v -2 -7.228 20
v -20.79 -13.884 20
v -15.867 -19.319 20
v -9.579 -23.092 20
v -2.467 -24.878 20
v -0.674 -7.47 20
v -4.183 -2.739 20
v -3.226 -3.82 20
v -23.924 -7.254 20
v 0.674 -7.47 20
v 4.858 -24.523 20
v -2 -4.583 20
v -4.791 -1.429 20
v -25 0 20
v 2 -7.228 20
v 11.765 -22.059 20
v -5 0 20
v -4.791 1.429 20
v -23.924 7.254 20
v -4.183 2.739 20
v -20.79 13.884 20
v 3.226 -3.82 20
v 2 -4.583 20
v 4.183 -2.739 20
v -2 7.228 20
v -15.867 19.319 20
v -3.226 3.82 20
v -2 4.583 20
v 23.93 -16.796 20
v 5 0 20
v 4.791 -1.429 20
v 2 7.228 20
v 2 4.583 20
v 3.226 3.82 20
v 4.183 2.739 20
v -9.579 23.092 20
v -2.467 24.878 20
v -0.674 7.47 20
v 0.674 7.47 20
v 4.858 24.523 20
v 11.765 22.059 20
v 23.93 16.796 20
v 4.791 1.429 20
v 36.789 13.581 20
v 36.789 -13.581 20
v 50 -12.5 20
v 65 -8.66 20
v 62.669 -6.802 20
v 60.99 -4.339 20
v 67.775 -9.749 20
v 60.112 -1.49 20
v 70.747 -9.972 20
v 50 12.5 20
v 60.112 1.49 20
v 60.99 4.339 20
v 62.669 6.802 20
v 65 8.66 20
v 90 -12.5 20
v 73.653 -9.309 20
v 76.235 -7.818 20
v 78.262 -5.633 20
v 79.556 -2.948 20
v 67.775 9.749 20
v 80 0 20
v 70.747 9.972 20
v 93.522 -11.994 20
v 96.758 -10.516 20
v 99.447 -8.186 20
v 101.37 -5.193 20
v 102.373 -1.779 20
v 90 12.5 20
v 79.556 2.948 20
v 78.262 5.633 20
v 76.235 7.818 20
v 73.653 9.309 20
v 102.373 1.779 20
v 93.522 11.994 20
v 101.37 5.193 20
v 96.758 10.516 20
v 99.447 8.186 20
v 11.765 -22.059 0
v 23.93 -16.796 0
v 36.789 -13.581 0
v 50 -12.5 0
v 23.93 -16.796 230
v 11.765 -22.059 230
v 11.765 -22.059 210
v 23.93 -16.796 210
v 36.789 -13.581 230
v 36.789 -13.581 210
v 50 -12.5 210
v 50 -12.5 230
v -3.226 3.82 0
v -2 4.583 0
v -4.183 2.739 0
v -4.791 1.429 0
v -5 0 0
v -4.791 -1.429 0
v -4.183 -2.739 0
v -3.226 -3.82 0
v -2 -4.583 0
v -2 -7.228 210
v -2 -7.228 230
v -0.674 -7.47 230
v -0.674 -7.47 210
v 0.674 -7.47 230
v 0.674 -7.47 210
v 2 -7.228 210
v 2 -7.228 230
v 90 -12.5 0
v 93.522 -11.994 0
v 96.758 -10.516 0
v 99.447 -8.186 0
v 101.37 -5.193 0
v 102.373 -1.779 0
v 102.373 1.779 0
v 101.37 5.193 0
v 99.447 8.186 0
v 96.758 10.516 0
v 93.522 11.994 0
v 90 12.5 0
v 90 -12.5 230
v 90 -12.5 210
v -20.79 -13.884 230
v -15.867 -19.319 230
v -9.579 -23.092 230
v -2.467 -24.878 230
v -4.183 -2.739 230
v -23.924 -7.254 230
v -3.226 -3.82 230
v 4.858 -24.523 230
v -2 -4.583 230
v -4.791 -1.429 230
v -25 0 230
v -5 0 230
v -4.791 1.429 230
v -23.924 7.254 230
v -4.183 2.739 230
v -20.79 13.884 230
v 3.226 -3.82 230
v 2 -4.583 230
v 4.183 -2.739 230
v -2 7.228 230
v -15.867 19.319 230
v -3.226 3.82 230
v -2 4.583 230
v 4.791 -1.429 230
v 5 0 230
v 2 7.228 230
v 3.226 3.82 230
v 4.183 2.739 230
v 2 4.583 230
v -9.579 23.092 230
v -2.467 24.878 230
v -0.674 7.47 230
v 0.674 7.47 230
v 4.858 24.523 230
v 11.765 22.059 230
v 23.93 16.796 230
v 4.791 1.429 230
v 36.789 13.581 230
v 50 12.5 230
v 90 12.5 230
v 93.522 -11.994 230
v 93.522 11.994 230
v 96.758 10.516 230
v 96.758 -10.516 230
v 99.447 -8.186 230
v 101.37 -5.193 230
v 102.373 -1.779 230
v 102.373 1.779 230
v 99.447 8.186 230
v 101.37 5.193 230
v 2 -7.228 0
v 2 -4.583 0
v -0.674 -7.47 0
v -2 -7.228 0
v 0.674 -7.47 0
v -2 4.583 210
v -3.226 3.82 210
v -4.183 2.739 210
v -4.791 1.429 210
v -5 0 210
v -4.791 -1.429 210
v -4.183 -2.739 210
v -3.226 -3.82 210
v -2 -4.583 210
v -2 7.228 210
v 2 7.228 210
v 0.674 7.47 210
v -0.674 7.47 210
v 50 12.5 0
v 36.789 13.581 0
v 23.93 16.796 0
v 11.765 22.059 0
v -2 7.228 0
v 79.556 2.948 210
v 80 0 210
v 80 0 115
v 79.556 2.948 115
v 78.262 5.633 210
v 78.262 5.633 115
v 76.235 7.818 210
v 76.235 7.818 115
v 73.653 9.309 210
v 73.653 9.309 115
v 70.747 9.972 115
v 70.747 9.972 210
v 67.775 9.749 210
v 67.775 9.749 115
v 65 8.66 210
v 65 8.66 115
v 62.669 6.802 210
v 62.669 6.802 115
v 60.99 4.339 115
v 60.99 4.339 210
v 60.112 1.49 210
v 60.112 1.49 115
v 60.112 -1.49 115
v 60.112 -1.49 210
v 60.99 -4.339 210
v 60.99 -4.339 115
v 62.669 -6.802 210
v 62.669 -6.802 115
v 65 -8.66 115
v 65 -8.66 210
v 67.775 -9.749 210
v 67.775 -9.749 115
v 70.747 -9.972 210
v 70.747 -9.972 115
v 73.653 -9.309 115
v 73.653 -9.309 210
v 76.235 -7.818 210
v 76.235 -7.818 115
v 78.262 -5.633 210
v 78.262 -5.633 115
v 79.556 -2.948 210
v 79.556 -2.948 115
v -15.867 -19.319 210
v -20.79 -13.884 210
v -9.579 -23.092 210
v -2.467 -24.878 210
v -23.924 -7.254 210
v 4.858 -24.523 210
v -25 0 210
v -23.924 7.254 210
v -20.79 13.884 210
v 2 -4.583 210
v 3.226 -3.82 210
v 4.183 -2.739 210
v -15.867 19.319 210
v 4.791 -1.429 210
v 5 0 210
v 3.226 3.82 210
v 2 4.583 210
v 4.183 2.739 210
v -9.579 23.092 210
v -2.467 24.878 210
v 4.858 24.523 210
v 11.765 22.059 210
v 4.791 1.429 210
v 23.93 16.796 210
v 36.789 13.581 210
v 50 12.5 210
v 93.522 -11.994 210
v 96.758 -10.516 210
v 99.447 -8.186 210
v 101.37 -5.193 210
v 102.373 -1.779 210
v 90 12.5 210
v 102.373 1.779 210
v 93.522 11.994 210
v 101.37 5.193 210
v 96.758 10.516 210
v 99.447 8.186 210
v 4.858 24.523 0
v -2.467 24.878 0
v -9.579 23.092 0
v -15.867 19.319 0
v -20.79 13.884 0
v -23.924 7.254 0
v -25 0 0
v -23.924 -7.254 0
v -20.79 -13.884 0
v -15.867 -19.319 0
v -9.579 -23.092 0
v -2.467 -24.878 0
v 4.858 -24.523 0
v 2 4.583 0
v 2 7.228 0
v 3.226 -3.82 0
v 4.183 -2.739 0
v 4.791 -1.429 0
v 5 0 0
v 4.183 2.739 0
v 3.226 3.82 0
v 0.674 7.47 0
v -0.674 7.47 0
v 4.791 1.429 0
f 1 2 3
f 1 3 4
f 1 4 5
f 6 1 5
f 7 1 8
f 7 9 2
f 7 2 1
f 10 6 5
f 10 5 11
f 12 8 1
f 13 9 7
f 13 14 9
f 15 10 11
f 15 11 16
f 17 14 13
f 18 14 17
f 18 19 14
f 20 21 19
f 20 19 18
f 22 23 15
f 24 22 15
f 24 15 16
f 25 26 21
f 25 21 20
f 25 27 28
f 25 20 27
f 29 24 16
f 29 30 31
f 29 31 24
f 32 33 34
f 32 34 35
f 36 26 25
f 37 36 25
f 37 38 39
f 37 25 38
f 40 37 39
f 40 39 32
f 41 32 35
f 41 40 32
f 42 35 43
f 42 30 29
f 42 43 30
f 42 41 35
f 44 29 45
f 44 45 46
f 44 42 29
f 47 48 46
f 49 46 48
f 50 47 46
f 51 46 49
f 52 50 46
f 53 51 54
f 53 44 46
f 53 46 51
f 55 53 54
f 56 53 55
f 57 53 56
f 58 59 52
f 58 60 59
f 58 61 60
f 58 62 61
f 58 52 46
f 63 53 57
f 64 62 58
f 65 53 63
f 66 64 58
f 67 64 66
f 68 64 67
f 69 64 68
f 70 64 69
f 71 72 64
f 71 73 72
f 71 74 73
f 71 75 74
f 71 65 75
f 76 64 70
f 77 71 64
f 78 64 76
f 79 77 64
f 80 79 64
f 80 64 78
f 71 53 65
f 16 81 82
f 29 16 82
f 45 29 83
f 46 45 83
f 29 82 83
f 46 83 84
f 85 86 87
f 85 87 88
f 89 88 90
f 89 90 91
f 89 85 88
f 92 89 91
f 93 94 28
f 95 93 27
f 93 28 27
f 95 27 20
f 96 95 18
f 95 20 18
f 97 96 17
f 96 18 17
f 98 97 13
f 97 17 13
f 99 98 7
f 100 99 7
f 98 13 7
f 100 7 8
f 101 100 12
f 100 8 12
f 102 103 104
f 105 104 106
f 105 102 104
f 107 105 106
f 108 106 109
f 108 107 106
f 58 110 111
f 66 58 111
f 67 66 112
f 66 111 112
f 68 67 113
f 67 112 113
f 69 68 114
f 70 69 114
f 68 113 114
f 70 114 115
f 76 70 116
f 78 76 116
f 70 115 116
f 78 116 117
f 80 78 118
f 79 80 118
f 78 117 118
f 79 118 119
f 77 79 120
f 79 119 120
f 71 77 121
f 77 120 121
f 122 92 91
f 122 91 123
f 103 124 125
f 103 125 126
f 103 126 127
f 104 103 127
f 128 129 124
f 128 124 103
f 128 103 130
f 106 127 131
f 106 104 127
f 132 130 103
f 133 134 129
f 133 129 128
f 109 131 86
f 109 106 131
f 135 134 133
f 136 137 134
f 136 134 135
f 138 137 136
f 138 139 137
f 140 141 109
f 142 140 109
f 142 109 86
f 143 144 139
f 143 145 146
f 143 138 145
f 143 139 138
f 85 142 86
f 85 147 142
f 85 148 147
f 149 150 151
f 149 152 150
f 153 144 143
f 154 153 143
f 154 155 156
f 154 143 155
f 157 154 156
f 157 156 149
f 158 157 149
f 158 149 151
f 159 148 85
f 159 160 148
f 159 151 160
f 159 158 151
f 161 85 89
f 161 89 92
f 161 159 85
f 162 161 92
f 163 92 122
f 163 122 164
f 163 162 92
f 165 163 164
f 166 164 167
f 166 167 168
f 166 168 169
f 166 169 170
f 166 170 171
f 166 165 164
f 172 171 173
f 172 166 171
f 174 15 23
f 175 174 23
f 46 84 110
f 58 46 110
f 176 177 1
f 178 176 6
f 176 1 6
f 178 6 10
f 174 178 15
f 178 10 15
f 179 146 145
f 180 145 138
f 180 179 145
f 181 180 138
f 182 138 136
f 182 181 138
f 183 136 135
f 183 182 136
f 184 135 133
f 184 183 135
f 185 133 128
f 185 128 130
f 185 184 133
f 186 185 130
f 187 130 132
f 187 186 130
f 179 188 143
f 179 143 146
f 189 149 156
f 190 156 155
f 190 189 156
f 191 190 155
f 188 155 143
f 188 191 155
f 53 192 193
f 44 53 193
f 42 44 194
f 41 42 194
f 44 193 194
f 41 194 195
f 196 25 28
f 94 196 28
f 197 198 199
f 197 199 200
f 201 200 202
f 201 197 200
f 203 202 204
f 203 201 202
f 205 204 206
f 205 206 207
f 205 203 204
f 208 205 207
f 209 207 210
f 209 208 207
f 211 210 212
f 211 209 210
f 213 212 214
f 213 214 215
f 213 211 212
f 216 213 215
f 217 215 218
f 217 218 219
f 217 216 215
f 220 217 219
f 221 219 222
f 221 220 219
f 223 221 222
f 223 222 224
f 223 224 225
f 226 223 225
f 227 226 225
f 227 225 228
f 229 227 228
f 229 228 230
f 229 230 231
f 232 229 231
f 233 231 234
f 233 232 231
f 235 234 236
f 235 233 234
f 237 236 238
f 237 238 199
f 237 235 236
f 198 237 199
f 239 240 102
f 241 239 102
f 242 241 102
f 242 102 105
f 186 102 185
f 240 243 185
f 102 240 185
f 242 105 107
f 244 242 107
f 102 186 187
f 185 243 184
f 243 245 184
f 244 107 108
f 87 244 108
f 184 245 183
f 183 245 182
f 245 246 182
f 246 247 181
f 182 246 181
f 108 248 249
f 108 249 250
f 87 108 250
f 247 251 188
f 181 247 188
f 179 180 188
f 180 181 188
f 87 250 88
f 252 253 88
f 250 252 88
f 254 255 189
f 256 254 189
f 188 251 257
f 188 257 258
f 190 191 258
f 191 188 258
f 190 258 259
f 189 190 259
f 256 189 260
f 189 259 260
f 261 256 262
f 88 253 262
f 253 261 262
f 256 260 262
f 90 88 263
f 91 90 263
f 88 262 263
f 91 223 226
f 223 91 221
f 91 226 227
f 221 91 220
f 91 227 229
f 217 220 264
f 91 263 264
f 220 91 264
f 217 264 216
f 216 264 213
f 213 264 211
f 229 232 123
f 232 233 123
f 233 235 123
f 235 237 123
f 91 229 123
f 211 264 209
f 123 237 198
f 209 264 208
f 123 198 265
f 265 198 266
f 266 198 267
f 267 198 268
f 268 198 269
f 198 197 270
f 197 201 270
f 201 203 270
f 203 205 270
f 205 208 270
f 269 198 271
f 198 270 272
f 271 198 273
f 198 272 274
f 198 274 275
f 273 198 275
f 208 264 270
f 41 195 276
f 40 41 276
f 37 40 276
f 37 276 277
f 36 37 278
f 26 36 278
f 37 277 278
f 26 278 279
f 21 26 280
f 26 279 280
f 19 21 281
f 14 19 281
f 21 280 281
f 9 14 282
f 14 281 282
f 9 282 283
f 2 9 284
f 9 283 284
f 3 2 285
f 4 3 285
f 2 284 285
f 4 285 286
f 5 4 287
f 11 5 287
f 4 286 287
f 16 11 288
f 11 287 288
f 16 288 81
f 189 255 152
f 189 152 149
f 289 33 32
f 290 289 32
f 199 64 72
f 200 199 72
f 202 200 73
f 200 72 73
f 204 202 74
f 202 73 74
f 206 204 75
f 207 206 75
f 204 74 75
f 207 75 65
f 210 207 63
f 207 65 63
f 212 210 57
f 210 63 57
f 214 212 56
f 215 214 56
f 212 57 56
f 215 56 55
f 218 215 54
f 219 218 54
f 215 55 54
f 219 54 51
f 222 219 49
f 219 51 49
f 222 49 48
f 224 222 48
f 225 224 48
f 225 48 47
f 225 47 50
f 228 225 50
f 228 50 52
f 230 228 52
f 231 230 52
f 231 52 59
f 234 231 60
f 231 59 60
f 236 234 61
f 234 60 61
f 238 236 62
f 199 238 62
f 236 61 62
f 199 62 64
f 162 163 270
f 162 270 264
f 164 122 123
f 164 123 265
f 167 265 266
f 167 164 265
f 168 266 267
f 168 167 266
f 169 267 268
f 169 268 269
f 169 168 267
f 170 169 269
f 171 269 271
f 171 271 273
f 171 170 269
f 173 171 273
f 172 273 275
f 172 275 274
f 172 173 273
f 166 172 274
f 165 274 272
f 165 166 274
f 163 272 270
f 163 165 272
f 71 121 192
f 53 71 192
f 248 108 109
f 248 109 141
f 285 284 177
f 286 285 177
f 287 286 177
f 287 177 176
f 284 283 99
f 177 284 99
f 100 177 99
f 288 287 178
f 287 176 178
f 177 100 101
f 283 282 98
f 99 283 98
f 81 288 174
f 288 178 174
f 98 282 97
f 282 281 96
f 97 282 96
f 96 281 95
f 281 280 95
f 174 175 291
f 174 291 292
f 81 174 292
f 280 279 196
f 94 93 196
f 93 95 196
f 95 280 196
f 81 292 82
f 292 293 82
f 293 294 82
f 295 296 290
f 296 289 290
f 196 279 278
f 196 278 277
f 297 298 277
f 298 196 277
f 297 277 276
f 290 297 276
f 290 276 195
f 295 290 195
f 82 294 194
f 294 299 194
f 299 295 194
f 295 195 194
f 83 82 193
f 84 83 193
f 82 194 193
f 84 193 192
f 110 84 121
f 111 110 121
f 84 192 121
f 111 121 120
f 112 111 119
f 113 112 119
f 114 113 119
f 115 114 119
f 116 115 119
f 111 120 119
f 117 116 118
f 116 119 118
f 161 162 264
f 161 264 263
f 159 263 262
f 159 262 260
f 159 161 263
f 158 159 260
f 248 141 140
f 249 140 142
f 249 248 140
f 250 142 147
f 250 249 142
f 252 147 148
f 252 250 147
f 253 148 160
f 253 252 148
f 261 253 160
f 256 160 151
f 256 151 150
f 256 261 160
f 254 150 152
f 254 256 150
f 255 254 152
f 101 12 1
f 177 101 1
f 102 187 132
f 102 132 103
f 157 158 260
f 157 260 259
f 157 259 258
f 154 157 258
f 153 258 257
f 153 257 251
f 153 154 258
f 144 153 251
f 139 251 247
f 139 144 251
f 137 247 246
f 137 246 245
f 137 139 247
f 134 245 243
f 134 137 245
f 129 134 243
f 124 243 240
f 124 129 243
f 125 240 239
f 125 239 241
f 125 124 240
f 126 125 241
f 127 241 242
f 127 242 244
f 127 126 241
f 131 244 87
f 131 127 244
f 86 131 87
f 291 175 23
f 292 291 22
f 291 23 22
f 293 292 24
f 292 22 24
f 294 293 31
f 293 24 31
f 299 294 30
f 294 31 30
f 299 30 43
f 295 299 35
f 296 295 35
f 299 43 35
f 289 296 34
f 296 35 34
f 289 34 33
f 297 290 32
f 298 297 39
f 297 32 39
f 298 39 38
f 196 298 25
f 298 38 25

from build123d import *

# Parameters (mm, degrees)
BOSS_EXTRUDE1_DEPTH = 20
SKETCH2_R           = 5
CUT_EXTRUDE1_DEPTH  = 20
CUT_EXTRUDE2_DEPTH  = 20
SKETCH6_R           = 10
BOSS_EXTRUDE2_DEPTH = 95


with BuildPart() as part:
    # Sketch1 → Boss-Extrude1 (new body)
    with BuildSketch(Plane.XY):
        with BuildLine():
            Line((90, 12.5), (50, 12.5))
            ThreePointArc((50, 12.5), (30.293980466, 14.925921863), (11.764705882, 22.058823529))
            ThreePointArc((11.764705882, 22.058823529), (-25, 0), (11.764705882, -22.058823529))
            ThreePointArc((11.764705882, -22.058823529), (30.293980466, -14.925921863), (50, -12.5))
            Line((50, -12.5), (90, -12.5))
            ThreePointArc((90, -12.5), (102.5, 0), (90, 12.5))
        make_face()
    extrude(amount=BOSS_EXTRUDE1_DEPTH)

    # Sketch2 → Cut-Extrude1 (cut)
    with BuildSketch(Plane.XY.offset(20)):
        Circle(SKETCH2_R)
    extrude(amount=-CUT_EXTRUDE1_DEPTH, mode=Mode.SUBTRACT)

    # Sketch5 → Cut-Extrude2 (cut)
    with BuildSketch(Plane.XY.offset(20)):
        with BuildLine():
            Line((-2, 7.228416147), (-2, -7.228416147))
            ThreePointArc((-2, -7.228416147), (0, -7.5), (2, -7.228416147))
            Line((2, -7.228416147), (2, 7.228416147))
            ThreePointArc((2, 7.228416147), (0, 7.5), (-2, 7.228416147))
        make_face()
    extrude(amount=-CUT_EXTRUDE2_DEPTH, mode=Mode.SUBTRACT)

    # Sketch6 → Boss-Extrude2 (add)
    with BuildSketch(Plane.XY.offset(20)):
        with Locations((70, 0)):
            Circle(SKETCH6_R)
    extrude(amount=BOSS_EXTRUDE2_DEPTH)

    # Mirror1: part across plane


with BuildPart() as part_1:
    add(part.part)
    add(part.part.mirror(Plane(origin=(70, 0, 115), x_dir=(1, 0, 0), z_dir=(0, 0, 1))))


solid = part_1.part
